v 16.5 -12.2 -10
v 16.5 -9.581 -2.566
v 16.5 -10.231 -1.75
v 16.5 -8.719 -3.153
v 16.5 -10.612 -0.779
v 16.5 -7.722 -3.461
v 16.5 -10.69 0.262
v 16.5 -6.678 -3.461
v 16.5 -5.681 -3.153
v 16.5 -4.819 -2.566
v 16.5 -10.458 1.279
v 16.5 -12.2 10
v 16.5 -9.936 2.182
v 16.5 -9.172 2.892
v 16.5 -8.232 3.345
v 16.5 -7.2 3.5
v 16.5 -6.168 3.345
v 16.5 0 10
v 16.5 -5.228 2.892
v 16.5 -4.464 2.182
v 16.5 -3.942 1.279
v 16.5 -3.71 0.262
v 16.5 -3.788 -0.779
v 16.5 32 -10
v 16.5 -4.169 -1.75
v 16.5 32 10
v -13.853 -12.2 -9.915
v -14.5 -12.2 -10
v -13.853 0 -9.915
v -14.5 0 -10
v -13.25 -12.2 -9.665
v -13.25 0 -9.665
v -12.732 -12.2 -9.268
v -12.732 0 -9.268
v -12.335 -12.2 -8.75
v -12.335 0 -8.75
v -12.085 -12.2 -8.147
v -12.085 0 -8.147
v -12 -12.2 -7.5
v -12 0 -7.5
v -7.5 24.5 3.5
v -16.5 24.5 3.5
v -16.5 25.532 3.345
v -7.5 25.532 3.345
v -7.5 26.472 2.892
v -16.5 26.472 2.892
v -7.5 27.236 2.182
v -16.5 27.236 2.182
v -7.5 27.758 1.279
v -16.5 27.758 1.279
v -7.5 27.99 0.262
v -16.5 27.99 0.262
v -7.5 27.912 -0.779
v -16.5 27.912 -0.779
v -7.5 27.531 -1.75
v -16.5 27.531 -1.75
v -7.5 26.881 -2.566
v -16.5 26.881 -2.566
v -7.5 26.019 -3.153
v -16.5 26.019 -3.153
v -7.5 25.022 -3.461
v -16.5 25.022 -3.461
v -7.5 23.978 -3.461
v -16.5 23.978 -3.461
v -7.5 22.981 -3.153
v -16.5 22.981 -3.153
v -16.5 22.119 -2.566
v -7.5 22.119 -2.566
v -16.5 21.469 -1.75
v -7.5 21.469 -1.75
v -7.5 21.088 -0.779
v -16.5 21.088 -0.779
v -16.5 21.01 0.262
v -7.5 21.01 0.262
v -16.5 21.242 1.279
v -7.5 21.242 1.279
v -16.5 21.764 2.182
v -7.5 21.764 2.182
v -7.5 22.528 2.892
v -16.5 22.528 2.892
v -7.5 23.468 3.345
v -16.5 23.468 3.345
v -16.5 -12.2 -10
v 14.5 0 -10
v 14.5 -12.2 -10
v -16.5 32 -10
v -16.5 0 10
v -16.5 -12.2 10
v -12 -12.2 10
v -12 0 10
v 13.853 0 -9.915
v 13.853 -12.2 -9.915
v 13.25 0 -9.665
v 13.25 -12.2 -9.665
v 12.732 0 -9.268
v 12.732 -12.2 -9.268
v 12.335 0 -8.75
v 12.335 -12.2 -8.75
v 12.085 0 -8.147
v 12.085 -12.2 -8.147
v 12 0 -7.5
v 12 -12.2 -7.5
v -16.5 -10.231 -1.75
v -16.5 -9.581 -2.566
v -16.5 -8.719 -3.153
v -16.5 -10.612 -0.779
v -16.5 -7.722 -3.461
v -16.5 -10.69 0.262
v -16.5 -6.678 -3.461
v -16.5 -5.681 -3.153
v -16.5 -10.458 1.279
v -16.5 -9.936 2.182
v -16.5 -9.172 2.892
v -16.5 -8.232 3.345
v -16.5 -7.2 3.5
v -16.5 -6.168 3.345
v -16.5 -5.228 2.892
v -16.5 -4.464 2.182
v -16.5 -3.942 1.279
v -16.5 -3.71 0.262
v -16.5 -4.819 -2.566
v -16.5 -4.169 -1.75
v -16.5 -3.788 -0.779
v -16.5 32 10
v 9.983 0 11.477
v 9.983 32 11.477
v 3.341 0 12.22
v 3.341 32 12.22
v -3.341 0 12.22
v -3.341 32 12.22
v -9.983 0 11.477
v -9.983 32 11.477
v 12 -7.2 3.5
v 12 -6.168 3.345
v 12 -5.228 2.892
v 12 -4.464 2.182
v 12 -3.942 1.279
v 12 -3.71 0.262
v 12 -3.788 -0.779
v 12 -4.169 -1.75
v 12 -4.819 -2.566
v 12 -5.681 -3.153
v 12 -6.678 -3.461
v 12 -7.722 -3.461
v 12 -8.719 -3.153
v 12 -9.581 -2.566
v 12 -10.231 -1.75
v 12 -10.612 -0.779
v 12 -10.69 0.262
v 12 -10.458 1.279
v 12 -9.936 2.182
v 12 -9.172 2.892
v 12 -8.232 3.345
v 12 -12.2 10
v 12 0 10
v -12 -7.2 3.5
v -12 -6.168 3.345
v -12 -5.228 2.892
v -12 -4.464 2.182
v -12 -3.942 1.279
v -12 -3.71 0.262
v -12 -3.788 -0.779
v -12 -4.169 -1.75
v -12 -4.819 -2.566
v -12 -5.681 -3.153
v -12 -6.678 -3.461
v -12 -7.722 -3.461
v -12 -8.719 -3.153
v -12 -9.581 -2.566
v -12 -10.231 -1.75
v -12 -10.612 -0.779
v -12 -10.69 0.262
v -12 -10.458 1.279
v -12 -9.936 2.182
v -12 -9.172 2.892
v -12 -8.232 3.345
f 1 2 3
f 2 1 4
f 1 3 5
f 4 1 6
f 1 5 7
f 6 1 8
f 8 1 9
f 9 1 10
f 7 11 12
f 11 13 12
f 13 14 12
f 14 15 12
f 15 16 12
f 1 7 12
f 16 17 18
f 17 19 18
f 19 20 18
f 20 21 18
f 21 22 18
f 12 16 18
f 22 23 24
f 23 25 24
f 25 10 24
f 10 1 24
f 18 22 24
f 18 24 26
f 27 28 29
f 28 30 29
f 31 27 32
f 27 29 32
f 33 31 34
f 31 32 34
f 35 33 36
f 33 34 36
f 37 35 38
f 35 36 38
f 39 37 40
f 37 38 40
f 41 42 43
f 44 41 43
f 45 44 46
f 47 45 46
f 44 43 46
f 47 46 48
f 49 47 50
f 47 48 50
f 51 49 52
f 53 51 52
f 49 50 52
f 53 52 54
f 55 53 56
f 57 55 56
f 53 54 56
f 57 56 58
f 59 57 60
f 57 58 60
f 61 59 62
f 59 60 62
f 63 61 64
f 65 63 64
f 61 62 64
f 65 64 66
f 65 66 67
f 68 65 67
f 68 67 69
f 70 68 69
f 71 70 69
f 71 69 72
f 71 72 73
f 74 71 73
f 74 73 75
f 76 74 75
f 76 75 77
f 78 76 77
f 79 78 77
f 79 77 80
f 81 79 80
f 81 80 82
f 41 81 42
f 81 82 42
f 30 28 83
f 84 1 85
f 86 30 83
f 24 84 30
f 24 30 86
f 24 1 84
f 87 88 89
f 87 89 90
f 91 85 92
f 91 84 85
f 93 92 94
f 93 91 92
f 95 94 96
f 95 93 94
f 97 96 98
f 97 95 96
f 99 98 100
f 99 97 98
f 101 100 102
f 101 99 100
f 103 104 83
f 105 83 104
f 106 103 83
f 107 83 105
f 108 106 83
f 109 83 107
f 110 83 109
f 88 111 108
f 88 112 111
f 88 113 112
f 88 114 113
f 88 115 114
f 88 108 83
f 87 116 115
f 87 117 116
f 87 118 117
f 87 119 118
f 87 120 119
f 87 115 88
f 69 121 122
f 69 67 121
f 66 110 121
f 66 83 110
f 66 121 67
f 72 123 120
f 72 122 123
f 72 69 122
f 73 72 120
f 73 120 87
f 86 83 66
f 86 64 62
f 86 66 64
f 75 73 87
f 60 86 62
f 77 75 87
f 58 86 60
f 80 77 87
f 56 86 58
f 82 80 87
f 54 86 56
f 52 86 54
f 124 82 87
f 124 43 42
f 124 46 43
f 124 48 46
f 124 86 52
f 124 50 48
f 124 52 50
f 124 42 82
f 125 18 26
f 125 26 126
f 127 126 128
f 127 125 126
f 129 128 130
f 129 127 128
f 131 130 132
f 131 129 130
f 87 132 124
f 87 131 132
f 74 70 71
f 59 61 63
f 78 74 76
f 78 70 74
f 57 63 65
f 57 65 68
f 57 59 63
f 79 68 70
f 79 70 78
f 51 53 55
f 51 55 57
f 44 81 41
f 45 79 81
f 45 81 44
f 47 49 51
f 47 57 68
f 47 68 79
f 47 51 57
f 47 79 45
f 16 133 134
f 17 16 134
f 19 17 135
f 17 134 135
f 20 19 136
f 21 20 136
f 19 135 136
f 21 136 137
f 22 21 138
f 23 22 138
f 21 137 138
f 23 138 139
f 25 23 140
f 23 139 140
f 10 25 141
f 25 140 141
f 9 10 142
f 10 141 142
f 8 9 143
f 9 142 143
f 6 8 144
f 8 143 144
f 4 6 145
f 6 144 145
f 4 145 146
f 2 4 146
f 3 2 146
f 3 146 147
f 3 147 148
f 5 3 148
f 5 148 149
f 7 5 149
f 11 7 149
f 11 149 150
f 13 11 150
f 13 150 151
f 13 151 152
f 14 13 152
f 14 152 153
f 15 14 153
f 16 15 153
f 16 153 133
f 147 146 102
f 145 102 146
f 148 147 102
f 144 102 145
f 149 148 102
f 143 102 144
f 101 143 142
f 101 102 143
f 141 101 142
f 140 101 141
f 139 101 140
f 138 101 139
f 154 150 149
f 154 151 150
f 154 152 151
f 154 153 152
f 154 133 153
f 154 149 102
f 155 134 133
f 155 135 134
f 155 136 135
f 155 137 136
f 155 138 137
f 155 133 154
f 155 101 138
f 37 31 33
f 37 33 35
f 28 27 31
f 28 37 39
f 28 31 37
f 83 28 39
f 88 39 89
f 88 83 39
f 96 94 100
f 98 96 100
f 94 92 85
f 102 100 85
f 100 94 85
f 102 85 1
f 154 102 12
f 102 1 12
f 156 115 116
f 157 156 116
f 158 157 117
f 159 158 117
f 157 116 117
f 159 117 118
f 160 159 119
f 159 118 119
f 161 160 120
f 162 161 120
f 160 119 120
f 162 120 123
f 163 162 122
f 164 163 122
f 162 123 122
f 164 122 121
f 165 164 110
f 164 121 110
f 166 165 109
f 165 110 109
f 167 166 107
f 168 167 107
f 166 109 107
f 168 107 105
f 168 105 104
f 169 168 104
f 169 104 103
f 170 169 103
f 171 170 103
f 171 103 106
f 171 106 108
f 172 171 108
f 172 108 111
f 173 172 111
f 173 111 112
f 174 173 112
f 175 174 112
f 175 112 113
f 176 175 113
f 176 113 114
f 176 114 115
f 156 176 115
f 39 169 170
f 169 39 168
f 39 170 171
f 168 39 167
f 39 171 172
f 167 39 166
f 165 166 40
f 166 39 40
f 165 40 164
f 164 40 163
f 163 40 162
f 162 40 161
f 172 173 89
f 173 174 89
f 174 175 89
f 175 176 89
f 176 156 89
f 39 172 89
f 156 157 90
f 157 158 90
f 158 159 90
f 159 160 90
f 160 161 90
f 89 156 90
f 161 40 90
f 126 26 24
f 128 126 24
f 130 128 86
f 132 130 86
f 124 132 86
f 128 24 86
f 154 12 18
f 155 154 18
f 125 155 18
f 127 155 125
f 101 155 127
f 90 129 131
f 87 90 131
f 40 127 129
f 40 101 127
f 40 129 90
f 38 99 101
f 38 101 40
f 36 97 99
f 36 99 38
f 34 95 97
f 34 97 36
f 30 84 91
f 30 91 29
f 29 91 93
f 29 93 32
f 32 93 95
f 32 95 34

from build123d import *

# Parameters (mm, degrees)
BOSS_EXTRUDE1_DEPTH = 32
SKETCH3_W           = 20
SKETCH3_H           = 12.2
BOSS_EXTRUDE2_DEPTH = 4.5
SKETCH4_R           = 3.5
CUT_EXTRUDE1_DEPTH  = 34
SKETCH5_R           = 3.5
CUT_EXTRUDE2_DEPTH  = 9
FILLET1_R           = 2.5


with BuildPart() as part:
    # Sketch1 → Boss-Extrude1 (new body)
    with BuildSketch(Plane(origin=(0, 0, 0), x_dir=(1, 0, 0), z_dir=(0, 1, 0))):
        with BuildLine():
            Line((-16.5, 10), (16.5, 10))
            Line((16.5, 10), (16.5, -10))
            ThreePointArc((16.5, -10), (0, -12.313346431), (-16.5, -10))
            Line((-16.5, -10), (-16.5, 10))
        make_face()
    extrude(amount=BOSS_EXTRUDE1_DEPTH)

    # Sketch3 → Boss-Extrude2 (add)
    with BuildSketch(Plane.ZY.offset(16.5)):
        with Locations((0, -6.1)):
            Rectangle(SKETCH3_W, SKETCH3_H)
    boss_extrude2 = extrude(amount=-BOSS_EXTRUDE2_DEPTH)

    # Mirror1: Boss-Extrude2 across plane
    add(boss_extrude2.mirror(Plane(origin=(0, 0, 0), x_dir=(0, 0, 1), z_dir=(1, 0, 0))))

    # Sketch4 → Cut-Extrude1 (cut, through all)
    with BuildSketch(Plane.ZY.offset(16.5)):
        with Locations((0, -7.2)):
            Circle(SKETCH4_R)
    extrude(amount=-CUT_EXTRUDE1_DEPTH, mode=Mode.SUBTRACT)

    # Sketch5 → Cut-Extrude2 (cut)
    with BuildSketch(Plane.ZY.offset(16.5)):
        with Locations((0, 24.5)):
            Circle(SKETCH5_R)
    extrude(amount=-CUT_EXTRUDE2_DEPTH, mode=Mode.SUBTRACT)

    # Fillet1
    fillet1_edges = [part.edges().sort_by_distance(p)[0] for p in [
        (-12, -6.1, -10),
        (12, -6.1, -10),
    ]]
    fillet(fillet1_edges, radius=FILLET1_R)


solid = part.part
